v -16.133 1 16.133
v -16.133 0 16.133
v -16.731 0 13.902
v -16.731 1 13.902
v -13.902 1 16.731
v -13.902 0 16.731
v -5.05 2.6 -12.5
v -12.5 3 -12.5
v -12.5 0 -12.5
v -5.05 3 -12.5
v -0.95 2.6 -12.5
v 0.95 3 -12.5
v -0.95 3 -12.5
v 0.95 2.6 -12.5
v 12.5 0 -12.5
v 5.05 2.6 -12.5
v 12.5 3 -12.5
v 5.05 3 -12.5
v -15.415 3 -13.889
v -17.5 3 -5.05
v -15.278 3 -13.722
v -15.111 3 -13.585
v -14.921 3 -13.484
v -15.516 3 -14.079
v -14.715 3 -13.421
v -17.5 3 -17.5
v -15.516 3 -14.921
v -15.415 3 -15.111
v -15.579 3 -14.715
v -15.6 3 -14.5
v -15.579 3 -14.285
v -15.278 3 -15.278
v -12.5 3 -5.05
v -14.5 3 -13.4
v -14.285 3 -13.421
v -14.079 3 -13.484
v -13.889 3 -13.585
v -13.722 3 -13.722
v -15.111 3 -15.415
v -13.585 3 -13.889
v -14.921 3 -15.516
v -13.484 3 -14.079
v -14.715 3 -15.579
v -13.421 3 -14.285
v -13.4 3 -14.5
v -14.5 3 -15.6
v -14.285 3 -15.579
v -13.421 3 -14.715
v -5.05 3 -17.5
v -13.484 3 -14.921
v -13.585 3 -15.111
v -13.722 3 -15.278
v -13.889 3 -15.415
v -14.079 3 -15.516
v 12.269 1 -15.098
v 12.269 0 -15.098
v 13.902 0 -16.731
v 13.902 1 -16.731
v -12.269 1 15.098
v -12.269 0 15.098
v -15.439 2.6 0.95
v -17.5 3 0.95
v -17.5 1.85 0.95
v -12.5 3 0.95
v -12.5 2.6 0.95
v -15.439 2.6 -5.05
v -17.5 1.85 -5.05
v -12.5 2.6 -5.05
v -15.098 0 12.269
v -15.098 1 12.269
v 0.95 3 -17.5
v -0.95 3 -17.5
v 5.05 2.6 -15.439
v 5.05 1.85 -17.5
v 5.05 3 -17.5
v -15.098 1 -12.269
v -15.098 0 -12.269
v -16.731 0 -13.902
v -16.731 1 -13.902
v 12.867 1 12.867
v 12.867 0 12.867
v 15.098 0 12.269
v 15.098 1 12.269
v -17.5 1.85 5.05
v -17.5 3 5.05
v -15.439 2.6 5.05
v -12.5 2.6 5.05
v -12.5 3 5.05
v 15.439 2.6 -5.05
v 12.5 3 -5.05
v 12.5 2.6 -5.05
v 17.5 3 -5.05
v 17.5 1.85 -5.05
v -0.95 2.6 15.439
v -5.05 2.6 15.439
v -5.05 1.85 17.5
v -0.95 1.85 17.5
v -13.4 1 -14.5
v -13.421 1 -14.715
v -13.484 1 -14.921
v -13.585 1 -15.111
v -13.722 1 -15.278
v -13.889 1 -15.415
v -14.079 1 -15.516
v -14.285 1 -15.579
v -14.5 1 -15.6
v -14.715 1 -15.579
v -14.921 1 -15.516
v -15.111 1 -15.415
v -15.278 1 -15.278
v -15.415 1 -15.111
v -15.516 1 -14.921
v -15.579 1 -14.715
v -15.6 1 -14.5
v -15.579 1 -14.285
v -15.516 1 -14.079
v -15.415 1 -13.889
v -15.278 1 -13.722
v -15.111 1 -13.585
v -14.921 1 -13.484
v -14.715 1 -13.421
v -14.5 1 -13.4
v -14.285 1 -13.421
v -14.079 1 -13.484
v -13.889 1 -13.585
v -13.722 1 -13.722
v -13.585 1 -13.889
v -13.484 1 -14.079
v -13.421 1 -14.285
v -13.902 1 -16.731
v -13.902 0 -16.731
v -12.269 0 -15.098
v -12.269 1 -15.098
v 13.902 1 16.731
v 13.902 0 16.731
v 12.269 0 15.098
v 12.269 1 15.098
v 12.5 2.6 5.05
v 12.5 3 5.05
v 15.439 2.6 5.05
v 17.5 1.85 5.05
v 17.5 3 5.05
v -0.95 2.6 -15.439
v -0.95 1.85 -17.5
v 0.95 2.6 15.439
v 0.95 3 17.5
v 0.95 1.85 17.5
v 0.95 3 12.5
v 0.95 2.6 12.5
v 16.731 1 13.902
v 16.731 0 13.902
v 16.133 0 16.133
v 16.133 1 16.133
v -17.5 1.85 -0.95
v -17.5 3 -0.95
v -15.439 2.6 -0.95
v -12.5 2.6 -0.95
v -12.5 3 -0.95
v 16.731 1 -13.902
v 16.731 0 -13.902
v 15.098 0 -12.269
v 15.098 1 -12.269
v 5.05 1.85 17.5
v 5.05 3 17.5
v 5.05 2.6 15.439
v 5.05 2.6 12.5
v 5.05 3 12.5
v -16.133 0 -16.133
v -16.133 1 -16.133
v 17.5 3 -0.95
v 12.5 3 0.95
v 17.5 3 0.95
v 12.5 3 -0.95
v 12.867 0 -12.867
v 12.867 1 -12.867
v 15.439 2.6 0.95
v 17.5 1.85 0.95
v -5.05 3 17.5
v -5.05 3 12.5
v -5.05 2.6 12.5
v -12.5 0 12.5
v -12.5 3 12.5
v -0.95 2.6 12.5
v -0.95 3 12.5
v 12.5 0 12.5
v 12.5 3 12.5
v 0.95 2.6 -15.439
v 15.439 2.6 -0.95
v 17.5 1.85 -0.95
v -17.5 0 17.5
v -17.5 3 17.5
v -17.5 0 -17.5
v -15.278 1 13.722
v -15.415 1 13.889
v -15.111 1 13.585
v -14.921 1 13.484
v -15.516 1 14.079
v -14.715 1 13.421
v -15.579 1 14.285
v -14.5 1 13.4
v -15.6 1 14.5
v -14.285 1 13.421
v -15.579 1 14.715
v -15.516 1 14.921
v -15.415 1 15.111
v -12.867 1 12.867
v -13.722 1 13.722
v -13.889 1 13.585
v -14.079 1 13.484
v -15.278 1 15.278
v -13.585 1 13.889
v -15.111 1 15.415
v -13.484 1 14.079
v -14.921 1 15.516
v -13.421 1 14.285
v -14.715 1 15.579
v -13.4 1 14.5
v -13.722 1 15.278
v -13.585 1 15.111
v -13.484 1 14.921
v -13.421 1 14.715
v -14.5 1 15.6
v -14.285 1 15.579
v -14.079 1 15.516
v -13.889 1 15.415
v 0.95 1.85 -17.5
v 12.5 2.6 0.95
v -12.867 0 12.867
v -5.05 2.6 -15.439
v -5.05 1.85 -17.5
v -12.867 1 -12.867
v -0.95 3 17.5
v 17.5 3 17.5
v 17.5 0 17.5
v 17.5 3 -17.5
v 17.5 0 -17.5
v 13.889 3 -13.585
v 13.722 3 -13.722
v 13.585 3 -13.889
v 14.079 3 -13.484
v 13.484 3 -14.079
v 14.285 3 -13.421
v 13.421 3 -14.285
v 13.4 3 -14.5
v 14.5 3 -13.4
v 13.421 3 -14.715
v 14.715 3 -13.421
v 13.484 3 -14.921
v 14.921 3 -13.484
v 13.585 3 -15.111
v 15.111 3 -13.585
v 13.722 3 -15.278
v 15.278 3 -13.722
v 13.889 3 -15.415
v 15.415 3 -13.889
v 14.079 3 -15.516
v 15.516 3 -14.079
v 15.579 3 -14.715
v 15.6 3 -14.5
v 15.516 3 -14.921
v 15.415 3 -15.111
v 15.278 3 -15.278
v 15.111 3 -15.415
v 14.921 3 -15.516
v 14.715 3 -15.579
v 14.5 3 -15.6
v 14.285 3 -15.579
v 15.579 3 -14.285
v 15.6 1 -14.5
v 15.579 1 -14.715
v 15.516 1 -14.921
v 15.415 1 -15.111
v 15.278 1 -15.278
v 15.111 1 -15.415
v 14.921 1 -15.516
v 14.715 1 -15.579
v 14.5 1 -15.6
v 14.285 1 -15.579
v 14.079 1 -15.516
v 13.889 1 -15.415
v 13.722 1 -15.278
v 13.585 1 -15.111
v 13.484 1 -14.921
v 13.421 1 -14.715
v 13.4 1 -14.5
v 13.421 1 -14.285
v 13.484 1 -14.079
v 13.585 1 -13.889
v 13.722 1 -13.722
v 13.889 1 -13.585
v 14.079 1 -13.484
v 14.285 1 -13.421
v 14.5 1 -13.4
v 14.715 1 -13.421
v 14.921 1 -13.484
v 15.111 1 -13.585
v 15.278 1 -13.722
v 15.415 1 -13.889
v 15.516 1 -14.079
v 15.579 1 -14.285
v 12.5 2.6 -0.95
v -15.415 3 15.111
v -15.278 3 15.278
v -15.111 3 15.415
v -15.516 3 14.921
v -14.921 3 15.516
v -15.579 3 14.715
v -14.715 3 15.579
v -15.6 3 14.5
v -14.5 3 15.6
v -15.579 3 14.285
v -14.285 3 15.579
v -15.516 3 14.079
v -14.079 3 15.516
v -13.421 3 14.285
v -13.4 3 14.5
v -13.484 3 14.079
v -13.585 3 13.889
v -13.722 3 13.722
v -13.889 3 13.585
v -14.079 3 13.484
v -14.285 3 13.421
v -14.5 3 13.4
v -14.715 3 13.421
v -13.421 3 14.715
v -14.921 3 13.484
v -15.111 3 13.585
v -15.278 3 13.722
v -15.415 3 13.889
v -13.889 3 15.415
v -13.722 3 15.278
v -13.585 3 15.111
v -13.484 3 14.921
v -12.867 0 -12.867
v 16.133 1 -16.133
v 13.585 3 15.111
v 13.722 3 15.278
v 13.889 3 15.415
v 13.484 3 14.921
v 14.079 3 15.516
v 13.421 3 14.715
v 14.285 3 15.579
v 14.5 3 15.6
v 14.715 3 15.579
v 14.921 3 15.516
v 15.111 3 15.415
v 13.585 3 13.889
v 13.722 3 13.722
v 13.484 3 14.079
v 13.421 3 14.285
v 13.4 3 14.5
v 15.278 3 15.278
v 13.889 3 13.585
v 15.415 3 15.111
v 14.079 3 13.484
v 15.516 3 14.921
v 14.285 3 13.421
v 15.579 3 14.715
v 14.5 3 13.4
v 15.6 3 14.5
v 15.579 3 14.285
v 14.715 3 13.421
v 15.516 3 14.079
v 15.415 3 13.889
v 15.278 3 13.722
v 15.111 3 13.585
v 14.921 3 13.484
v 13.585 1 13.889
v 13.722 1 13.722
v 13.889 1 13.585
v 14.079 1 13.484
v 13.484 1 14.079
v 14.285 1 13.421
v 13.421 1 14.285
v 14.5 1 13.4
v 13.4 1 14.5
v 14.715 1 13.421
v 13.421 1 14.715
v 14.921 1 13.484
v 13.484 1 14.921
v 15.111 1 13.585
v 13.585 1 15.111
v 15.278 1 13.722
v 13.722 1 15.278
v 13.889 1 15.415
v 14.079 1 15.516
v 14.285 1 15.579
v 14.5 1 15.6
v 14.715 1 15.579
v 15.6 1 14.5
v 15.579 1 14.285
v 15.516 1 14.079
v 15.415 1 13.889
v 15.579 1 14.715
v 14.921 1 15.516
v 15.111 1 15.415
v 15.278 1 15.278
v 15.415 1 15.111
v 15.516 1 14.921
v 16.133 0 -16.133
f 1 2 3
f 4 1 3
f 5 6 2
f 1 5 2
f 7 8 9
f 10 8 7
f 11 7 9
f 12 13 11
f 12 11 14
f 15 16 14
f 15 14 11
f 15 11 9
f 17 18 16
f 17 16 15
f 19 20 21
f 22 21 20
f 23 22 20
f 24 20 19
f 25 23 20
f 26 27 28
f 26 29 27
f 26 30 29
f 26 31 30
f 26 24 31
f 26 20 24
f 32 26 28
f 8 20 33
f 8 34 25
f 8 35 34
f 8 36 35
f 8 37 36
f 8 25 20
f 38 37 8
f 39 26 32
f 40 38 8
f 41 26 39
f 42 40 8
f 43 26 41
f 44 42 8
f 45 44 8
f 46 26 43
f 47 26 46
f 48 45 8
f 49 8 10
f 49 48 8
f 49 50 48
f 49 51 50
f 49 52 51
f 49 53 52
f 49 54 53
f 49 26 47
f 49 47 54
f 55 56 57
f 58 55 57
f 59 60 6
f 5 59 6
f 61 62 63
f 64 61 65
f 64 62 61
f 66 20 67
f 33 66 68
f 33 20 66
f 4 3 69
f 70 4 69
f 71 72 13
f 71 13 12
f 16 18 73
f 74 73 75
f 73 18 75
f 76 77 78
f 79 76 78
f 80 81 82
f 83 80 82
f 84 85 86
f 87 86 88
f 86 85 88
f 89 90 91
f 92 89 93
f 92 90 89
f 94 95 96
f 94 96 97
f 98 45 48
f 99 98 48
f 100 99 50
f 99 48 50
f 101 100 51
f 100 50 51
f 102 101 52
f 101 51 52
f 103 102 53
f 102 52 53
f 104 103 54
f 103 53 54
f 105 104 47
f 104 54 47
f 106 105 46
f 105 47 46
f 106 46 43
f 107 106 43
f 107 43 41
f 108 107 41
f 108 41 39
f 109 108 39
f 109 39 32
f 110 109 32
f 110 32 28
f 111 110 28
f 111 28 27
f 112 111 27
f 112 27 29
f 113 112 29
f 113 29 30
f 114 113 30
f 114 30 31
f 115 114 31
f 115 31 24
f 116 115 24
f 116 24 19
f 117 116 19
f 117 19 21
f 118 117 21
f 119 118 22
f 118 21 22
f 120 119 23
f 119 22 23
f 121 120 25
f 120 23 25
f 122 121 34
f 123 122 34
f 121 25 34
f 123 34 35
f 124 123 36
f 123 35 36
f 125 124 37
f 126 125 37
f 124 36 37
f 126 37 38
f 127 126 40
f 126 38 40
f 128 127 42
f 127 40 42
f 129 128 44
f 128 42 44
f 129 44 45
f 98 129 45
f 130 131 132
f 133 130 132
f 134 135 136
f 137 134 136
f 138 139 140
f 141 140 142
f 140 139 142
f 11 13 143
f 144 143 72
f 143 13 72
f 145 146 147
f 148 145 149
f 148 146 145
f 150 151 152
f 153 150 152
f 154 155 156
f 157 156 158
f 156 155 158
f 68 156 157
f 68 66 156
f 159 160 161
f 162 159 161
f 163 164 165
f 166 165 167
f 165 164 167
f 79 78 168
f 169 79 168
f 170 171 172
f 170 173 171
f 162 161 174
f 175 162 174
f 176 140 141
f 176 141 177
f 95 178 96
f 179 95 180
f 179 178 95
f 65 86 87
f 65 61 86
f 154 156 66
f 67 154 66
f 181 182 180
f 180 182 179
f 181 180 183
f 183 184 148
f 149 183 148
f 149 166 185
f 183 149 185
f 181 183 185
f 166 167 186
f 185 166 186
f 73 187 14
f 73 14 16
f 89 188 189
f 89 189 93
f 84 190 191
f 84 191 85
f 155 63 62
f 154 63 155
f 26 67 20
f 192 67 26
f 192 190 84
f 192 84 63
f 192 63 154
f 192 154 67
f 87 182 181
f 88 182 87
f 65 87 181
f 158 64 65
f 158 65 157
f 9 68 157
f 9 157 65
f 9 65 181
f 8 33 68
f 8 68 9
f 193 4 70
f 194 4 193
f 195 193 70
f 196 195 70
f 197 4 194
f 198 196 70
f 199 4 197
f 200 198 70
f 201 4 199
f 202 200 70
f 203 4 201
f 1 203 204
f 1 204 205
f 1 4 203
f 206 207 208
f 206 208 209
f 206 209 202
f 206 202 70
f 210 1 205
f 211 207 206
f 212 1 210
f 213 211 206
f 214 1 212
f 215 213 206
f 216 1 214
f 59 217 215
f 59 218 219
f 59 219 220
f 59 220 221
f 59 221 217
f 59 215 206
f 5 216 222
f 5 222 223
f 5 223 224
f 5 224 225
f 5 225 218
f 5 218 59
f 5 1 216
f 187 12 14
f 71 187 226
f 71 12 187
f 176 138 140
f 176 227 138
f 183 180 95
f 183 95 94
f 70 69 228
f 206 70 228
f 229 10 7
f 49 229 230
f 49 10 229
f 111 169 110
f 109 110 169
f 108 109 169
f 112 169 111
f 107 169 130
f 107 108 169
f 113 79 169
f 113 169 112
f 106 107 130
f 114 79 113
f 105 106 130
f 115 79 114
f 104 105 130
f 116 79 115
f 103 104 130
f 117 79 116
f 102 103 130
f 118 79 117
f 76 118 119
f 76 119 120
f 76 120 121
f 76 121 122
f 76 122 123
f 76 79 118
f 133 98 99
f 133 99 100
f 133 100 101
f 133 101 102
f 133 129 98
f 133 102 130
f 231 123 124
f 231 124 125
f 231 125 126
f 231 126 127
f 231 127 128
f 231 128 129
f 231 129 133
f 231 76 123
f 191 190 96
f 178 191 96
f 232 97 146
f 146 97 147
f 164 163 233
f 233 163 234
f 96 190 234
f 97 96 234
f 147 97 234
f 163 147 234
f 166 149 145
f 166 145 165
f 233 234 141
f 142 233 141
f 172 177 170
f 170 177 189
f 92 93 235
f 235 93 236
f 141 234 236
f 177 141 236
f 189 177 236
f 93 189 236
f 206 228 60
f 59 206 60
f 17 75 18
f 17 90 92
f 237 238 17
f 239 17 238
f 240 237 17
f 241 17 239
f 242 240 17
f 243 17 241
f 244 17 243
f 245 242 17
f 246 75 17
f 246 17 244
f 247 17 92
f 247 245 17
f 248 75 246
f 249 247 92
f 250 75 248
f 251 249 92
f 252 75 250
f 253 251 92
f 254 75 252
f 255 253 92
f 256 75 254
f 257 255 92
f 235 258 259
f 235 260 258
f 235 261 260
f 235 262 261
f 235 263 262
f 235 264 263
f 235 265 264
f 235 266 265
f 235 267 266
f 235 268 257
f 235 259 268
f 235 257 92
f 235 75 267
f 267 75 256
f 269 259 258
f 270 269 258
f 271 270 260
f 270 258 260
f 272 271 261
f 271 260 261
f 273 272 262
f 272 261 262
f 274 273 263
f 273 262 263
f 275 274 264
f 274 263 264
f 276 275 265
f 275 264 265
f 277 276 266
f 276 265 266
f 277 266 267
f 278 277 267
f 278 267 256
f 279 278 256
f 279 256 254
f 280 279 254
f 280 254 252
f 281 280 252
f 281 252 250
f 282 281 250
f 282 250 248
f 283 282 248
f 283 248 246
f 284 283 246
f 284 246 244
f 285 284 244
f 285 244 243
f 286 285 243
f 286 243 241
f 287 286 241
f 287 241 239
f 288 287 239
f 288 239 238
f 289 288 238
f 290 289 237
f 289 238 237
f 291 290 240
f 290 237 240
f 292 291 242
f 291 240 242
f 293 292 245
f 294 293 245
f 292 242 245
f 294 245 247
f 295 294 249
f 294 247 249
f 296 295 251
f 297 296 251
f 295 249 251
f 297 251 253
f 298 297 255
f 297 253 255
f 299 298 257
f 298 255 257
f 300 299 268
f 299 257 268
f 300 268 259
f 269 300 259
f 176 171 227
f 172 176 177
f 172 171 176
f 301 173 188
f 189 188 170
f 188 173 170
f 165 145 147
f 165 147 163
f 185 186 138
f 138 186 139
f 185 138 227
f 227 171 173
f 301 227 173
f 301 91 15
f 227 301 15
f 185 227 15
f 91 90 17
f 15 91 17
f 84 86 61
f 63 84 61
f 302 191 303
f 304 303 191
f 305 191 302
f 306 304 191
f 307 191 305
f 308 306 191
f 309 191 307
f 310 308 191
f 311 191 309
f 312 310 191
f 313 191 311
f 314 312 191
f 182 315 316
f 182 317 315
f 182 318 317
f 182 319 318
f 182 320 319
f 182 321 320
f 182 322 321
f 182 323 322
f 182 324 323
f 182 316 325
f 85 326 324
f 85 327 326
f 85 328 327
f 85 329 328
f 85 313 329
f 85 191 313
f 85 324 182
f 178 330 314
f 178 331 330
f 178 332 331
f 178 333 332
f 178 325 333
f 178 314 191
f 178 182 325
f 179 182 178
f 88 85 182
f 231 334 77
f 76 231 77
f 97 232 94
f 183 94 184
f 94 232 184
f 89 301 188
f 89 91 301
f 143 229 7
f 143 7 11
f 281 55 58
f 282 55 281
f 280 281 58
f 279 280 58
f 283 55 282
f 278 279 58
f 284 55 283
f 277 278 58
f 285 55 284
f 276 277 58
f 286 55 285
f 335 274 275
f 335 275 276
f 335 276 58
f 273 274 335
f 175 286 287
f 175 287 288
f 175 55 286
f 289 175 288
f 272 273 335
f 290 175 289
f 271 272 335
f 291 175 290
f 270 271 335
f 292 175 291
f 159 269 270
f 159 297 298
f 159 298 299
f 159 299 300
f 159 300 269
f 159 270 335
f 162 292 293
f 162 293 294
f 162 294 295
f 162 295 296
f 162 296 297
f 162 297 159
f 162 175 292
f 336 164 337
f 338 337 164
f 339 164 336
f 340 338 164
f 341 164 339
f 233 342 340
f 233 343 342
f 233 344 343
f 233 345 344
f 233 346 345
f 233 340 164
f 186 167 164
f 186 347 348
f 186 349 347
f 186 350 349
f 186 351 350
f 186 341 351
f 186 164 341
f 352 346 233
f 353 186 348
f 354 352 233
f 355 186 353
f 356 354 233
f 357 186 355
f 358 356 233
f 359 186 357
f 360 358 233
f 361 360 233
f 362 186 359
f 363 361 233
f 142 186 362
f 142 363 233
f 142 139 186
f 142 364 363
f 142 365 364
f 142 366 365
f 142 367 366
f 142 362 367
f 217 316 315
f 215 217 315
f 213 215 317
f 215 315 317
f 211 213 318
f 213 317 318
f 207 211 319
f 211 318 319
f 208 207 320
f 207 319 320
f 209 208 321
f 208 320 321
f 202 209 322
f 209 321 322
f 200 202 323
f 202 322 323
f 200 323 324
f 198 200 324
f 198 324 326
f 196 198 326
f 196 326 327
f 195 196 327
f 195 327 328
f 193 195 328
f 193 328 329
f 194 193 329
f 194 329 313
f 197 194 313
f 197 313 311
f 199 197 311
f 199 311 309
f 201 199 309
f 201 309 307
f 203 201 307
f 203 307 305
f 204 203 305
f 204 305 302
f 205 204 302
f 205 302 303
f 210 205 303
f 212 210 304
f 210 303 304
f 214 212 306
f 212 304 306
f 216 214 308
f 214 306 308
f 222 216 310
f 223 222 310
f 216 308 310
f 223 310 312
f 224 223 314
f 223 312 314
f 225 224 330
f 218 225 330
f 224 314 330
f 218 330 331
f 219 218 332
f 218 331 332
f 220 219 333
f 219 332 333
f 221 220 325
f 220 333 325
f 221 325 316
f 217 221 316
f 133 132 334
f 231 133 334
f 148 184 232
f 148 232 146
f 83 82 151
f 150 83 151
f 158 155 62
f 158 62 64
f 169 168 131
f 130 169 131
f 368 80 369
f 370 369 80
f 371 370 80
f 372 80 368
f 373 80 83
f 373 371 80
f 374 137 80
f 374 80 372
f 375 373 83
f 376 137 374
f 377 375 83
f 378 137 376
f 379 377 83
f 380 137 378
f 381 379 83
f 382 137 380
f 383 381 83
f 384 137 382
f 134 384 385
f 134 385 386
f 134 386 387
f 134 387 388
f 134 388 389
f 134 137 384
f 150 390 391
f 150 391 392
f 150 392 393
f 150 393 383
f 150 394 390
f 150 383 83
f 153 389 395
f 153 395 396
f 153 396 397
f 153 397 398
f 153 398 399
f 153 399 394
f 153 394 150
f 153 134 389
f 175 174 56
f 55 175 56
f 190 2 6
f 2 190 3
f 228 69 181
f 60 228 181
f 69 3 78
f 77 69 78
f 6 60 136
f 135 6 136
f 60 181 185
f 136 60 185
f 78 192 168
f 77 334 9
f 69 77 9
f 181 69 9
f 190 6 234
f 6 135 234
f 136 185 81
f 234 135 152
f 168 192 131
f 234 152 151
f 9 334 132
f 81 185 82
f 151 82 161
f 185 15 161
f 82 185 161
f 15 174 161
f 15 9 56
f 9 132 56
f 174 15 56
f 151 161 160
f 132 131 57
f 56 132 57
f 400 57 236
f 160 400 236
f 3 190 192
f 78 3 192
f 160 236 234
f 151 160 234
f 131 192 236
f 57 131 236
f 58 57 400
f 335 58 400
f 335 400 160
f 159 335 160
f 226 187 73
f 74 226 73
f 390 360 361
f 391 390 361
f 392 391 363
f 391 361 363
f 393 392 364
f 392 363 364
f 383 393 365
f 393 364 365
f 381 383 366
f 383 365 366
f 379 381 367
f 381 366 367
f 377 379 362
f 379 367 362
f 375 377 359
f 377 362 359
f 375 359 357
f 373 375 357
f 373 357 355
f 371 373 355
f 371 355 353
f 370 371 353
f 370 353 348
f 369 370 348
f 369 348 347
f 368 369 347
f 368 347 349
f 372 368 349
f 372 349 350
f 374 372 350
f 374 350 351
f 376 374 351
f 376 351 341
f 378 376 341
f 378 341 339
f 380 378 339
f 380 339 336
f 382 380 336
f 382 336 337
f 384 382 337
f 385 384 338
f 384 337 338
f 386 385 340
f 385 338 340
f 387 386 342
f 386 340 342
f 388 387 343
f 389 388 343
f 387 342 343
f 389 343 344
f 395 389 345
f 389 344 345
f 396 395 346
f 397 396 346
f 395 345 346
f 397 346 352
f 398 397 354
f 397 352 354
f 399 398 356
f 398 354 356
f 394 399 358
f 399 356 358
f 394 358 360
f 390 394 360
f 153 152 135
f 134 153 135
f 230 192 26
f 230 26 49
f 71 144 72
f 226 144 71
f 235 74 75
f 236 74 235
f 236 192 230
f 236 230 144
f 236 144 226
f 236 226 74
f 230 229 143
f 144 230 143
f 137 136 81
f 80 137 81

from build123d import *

# Parameters (mm, degrees)
SKETCH1_W             = 35
SKETCH1_H             = 35
BOSS_EXTRUDE1_DEPTH   = 3
SKETCH3_W             = 25
SKETCH3_H             = 25
CUT_EXTRUDE1_DEPTH    = 4
SKETCH4_W             = 5
SKETCH4_H             = 4.1
SKETCH4_W_2           = 4.1
SKETCH4_H_2           = 5
CUT_EXTRUDE2_DEPTH    = 0.4
CHAMFER1_SIZE         = 0.75
CHAMFER1_SIZE2        = 2.060608065
CHAMFER1_PART_2_SIZE  = 0.75
CHAMFER1_PART_2_SIZE2 = 2.060608065
CHAMFER1_PART_3_SIZE  = 0.75
CHAMFER1_PART_3_SIZE2 = 2.060608065
CHAMFER1_PART_4_SIZE  = 0.75
CHAMFER1_PART_4_SIZE2 = 2.060608065
SKETCH6_R             = 1.1
CUT_EXTRUDE5_DEPTH    = 4
CUT_EXTRUDE6_DEPTH    = 1


with BuildPart() as part:
    # Sketch1 → Boss-Extrude1 (new body)
    with BuildSketch(Plane(origin=(0, 0, 0), x_dir=(1, 0, 0), z_dir=(0, 1, 0))):
        Rectangle(SKETCH1_W, SKETCH1_H)
    extrude(amount=BOSS_EXTRUDE1_DEPTH)

    # Sketch3 → Cut-Extrude1 (cut, through all)
    with BuildSketch(Plane(origin=(0, 3, 0), x_dir=(1, 0, 0), z_dir=(0, 1, 0))):
        Rectangle(SKETCH3_W, SKETCH3_H)
    extrude(amount=-CUT_EXTRUDE1_DEPTH, mode=Mode.SUBTRACT)

    # Sketch4 → Cut-Extrude2 (cut)
    with BuildSketch(Plane(origin=(0, 3, 0), x_dir=(1, 0, 0), z_dir=(0, 1, 0))):
        with Locations((-15, 3)):
            Rectangle(SKETCH4_W, SKETCH4_H)
        with Locations((-3, 15)):
            Rectangle(SKETCH4_W_2, SKETCH4_H_2)
        with Locations((3, 15)):
            Rectangle(SKETCH4_W_2, SKETCH4_H_2)
        with Locations((15, 3)):
            Rectangle(SKETCH4_W, SKETCH4_H)
        with Locations((15, -3)):
            Rectangle(SKETCH4_W, SKETCH4_H)
        with Locations((3, -15)):
            Rectangle(SKETCH4_W_2, SKETCH4_H_2)
        with Locations((-3, -15)):
            Rectangle(SKETCH4_W_2, SKETCH4_H_2)
        with Locations((-15, -3)):
            Rectangle(SKETCH4_W, SKETCH4_H)
    extrude(amount=-CUT_EXTRUDE2_DEPTH, mode=Mode.SUBTRACT)

    # Chamfer1
    chamfer1_edges = [part.edges().sort_by_distance(p)[0] for p in [
        (3, 2.6, 17.5),
        (-3, 2.6, 17.5),
    ]]
    chamfer1_side = [part.faces().sort_by_distance(p)[0] for p in [
        (0, 1.458081007, 17.5),
    ]]
    chamfer(chamfer1_edges, length=CHAMFER1_SIZE, length2=CHAMFER1_SIZE2, reference=chamfer1_side[0])

    # Chamfer1 part 2
    chamfer1_part_2_edges = [part.edges().sort_by_distance(p)[0] for p in [
        (-17.5, 2.6, 3),
        (-17.5, 2.6, -3),
    ]]
    chamfer1_part_2_side = [part.faces().sort_by_distance(p)[0] for p in [
        (-17.5, 1.458081007, 0),
    ]]
    chamfer(chamfer1_part_2_edges, length=CHAMFER1_PART_2_SIZE, length2=CHAMFER1_PART_2_SIZE2, reference=chamfer1_part_2_side[0])

    # Chamfer1 part 3
    chamfer1_part_3_edges = [part.edges().sort_by_distance(p)[0] for p in [
        (-3, 2.6, -17.5),
        (3, 2.6, -17.5),
    ]]
    chamfer1_part_3_side = [part.faces().sort_by_distance(p)[0] for p in [
        (0, 1.458081007, -17.5),
    ]]
    chamfer(chamfer1_part_3_edges, length=CHAMFER1_PART_3_SIZE, length2=CHAMFER1_PART_3_SIZE2, reference=chamfer1_part_3_side[0])

    # Chamfer1 part 4
    chamfer1_part_4_edges = [part.edges().sort_by_distance(p)[0] for p in [
        (17.5, 2.6, -3),
        (17.5, 2.6, 3),
    ]]
    chamfer1_part_4_side = [part.faces().sort_by_distance(p)[0] for p in [
        (17.5, 1.458081007, 0),
    ]]
    chamfer(chamfer1_part_4_edges, length=CHAMFER1_PART_4_SIZE, length2=CHAMFER1_PART_4_SIZE2, reference=chamfer1_part_4_side[0])

    # Sketch6 → Cut-Extrude5 (cut, through all)
    with BuildSketch(Plane(origin=(0, 3, 0), x_dir=(1, 0, 0), z_dir=(0, 1, 0))):
        with Locations((14.5, 14.5)):
            Circle(SKETCH6_R)
        with Locations((-14.5, 14.5)):
            Circle(SKETCH6_R)
        with Locations((-14.5, -14.5)):
            Circle(SKETCH6_R)
        with Locations((14.5, -14.5)):
            Circle(SKETCH6_R)
    extrude(amount=-CUT_EXTRUDE5_DEPTH, mode=Mode.SUBTRACT)

    # Sketch7 → Cut-Extrude6 (cut)
    with BuildSketch(Plane.XZ):
        Polygon((-12.867006838, 12.867006838), (-12.269289857, 15.097716981), (-13.902283019, 16.730710143), (-16.132993162, 16.132993162), (-16.730710143, 13.902283019), (-15.097716981, 12.269289857), align=None)
        Polygon((12.867006838, 12.867006838), (15.097716981, 12.269289857), (16.730710143, 13.902283019), (16.132993162, 16.132993162), (13.902283019, 16.730710143), (12.269289857, 15.097716981), align=None)
        Polygon((12.867006838, -12.867006838), (12.269289857, -15.097716981), (13.902283019, -16.730710143), (16.132993162, -16.132993162), (16.730710143, -13.902283019), (15.097716981, -12.269289857), align=None)
        Polygon((-12.867006838, -12.867006838), (-15.097716981, -12.269289857), (-16.730710143, -13.902283019), (-16.132993162, -16.132993162), (-13.902283019, -16.730710143), (-12.269289857, -15.097716981), align=None)
    extrude(amount=-CUT_EXTRUDE6_DEPTH, mode=Mode.SUBTRACT)


solid = part.part
